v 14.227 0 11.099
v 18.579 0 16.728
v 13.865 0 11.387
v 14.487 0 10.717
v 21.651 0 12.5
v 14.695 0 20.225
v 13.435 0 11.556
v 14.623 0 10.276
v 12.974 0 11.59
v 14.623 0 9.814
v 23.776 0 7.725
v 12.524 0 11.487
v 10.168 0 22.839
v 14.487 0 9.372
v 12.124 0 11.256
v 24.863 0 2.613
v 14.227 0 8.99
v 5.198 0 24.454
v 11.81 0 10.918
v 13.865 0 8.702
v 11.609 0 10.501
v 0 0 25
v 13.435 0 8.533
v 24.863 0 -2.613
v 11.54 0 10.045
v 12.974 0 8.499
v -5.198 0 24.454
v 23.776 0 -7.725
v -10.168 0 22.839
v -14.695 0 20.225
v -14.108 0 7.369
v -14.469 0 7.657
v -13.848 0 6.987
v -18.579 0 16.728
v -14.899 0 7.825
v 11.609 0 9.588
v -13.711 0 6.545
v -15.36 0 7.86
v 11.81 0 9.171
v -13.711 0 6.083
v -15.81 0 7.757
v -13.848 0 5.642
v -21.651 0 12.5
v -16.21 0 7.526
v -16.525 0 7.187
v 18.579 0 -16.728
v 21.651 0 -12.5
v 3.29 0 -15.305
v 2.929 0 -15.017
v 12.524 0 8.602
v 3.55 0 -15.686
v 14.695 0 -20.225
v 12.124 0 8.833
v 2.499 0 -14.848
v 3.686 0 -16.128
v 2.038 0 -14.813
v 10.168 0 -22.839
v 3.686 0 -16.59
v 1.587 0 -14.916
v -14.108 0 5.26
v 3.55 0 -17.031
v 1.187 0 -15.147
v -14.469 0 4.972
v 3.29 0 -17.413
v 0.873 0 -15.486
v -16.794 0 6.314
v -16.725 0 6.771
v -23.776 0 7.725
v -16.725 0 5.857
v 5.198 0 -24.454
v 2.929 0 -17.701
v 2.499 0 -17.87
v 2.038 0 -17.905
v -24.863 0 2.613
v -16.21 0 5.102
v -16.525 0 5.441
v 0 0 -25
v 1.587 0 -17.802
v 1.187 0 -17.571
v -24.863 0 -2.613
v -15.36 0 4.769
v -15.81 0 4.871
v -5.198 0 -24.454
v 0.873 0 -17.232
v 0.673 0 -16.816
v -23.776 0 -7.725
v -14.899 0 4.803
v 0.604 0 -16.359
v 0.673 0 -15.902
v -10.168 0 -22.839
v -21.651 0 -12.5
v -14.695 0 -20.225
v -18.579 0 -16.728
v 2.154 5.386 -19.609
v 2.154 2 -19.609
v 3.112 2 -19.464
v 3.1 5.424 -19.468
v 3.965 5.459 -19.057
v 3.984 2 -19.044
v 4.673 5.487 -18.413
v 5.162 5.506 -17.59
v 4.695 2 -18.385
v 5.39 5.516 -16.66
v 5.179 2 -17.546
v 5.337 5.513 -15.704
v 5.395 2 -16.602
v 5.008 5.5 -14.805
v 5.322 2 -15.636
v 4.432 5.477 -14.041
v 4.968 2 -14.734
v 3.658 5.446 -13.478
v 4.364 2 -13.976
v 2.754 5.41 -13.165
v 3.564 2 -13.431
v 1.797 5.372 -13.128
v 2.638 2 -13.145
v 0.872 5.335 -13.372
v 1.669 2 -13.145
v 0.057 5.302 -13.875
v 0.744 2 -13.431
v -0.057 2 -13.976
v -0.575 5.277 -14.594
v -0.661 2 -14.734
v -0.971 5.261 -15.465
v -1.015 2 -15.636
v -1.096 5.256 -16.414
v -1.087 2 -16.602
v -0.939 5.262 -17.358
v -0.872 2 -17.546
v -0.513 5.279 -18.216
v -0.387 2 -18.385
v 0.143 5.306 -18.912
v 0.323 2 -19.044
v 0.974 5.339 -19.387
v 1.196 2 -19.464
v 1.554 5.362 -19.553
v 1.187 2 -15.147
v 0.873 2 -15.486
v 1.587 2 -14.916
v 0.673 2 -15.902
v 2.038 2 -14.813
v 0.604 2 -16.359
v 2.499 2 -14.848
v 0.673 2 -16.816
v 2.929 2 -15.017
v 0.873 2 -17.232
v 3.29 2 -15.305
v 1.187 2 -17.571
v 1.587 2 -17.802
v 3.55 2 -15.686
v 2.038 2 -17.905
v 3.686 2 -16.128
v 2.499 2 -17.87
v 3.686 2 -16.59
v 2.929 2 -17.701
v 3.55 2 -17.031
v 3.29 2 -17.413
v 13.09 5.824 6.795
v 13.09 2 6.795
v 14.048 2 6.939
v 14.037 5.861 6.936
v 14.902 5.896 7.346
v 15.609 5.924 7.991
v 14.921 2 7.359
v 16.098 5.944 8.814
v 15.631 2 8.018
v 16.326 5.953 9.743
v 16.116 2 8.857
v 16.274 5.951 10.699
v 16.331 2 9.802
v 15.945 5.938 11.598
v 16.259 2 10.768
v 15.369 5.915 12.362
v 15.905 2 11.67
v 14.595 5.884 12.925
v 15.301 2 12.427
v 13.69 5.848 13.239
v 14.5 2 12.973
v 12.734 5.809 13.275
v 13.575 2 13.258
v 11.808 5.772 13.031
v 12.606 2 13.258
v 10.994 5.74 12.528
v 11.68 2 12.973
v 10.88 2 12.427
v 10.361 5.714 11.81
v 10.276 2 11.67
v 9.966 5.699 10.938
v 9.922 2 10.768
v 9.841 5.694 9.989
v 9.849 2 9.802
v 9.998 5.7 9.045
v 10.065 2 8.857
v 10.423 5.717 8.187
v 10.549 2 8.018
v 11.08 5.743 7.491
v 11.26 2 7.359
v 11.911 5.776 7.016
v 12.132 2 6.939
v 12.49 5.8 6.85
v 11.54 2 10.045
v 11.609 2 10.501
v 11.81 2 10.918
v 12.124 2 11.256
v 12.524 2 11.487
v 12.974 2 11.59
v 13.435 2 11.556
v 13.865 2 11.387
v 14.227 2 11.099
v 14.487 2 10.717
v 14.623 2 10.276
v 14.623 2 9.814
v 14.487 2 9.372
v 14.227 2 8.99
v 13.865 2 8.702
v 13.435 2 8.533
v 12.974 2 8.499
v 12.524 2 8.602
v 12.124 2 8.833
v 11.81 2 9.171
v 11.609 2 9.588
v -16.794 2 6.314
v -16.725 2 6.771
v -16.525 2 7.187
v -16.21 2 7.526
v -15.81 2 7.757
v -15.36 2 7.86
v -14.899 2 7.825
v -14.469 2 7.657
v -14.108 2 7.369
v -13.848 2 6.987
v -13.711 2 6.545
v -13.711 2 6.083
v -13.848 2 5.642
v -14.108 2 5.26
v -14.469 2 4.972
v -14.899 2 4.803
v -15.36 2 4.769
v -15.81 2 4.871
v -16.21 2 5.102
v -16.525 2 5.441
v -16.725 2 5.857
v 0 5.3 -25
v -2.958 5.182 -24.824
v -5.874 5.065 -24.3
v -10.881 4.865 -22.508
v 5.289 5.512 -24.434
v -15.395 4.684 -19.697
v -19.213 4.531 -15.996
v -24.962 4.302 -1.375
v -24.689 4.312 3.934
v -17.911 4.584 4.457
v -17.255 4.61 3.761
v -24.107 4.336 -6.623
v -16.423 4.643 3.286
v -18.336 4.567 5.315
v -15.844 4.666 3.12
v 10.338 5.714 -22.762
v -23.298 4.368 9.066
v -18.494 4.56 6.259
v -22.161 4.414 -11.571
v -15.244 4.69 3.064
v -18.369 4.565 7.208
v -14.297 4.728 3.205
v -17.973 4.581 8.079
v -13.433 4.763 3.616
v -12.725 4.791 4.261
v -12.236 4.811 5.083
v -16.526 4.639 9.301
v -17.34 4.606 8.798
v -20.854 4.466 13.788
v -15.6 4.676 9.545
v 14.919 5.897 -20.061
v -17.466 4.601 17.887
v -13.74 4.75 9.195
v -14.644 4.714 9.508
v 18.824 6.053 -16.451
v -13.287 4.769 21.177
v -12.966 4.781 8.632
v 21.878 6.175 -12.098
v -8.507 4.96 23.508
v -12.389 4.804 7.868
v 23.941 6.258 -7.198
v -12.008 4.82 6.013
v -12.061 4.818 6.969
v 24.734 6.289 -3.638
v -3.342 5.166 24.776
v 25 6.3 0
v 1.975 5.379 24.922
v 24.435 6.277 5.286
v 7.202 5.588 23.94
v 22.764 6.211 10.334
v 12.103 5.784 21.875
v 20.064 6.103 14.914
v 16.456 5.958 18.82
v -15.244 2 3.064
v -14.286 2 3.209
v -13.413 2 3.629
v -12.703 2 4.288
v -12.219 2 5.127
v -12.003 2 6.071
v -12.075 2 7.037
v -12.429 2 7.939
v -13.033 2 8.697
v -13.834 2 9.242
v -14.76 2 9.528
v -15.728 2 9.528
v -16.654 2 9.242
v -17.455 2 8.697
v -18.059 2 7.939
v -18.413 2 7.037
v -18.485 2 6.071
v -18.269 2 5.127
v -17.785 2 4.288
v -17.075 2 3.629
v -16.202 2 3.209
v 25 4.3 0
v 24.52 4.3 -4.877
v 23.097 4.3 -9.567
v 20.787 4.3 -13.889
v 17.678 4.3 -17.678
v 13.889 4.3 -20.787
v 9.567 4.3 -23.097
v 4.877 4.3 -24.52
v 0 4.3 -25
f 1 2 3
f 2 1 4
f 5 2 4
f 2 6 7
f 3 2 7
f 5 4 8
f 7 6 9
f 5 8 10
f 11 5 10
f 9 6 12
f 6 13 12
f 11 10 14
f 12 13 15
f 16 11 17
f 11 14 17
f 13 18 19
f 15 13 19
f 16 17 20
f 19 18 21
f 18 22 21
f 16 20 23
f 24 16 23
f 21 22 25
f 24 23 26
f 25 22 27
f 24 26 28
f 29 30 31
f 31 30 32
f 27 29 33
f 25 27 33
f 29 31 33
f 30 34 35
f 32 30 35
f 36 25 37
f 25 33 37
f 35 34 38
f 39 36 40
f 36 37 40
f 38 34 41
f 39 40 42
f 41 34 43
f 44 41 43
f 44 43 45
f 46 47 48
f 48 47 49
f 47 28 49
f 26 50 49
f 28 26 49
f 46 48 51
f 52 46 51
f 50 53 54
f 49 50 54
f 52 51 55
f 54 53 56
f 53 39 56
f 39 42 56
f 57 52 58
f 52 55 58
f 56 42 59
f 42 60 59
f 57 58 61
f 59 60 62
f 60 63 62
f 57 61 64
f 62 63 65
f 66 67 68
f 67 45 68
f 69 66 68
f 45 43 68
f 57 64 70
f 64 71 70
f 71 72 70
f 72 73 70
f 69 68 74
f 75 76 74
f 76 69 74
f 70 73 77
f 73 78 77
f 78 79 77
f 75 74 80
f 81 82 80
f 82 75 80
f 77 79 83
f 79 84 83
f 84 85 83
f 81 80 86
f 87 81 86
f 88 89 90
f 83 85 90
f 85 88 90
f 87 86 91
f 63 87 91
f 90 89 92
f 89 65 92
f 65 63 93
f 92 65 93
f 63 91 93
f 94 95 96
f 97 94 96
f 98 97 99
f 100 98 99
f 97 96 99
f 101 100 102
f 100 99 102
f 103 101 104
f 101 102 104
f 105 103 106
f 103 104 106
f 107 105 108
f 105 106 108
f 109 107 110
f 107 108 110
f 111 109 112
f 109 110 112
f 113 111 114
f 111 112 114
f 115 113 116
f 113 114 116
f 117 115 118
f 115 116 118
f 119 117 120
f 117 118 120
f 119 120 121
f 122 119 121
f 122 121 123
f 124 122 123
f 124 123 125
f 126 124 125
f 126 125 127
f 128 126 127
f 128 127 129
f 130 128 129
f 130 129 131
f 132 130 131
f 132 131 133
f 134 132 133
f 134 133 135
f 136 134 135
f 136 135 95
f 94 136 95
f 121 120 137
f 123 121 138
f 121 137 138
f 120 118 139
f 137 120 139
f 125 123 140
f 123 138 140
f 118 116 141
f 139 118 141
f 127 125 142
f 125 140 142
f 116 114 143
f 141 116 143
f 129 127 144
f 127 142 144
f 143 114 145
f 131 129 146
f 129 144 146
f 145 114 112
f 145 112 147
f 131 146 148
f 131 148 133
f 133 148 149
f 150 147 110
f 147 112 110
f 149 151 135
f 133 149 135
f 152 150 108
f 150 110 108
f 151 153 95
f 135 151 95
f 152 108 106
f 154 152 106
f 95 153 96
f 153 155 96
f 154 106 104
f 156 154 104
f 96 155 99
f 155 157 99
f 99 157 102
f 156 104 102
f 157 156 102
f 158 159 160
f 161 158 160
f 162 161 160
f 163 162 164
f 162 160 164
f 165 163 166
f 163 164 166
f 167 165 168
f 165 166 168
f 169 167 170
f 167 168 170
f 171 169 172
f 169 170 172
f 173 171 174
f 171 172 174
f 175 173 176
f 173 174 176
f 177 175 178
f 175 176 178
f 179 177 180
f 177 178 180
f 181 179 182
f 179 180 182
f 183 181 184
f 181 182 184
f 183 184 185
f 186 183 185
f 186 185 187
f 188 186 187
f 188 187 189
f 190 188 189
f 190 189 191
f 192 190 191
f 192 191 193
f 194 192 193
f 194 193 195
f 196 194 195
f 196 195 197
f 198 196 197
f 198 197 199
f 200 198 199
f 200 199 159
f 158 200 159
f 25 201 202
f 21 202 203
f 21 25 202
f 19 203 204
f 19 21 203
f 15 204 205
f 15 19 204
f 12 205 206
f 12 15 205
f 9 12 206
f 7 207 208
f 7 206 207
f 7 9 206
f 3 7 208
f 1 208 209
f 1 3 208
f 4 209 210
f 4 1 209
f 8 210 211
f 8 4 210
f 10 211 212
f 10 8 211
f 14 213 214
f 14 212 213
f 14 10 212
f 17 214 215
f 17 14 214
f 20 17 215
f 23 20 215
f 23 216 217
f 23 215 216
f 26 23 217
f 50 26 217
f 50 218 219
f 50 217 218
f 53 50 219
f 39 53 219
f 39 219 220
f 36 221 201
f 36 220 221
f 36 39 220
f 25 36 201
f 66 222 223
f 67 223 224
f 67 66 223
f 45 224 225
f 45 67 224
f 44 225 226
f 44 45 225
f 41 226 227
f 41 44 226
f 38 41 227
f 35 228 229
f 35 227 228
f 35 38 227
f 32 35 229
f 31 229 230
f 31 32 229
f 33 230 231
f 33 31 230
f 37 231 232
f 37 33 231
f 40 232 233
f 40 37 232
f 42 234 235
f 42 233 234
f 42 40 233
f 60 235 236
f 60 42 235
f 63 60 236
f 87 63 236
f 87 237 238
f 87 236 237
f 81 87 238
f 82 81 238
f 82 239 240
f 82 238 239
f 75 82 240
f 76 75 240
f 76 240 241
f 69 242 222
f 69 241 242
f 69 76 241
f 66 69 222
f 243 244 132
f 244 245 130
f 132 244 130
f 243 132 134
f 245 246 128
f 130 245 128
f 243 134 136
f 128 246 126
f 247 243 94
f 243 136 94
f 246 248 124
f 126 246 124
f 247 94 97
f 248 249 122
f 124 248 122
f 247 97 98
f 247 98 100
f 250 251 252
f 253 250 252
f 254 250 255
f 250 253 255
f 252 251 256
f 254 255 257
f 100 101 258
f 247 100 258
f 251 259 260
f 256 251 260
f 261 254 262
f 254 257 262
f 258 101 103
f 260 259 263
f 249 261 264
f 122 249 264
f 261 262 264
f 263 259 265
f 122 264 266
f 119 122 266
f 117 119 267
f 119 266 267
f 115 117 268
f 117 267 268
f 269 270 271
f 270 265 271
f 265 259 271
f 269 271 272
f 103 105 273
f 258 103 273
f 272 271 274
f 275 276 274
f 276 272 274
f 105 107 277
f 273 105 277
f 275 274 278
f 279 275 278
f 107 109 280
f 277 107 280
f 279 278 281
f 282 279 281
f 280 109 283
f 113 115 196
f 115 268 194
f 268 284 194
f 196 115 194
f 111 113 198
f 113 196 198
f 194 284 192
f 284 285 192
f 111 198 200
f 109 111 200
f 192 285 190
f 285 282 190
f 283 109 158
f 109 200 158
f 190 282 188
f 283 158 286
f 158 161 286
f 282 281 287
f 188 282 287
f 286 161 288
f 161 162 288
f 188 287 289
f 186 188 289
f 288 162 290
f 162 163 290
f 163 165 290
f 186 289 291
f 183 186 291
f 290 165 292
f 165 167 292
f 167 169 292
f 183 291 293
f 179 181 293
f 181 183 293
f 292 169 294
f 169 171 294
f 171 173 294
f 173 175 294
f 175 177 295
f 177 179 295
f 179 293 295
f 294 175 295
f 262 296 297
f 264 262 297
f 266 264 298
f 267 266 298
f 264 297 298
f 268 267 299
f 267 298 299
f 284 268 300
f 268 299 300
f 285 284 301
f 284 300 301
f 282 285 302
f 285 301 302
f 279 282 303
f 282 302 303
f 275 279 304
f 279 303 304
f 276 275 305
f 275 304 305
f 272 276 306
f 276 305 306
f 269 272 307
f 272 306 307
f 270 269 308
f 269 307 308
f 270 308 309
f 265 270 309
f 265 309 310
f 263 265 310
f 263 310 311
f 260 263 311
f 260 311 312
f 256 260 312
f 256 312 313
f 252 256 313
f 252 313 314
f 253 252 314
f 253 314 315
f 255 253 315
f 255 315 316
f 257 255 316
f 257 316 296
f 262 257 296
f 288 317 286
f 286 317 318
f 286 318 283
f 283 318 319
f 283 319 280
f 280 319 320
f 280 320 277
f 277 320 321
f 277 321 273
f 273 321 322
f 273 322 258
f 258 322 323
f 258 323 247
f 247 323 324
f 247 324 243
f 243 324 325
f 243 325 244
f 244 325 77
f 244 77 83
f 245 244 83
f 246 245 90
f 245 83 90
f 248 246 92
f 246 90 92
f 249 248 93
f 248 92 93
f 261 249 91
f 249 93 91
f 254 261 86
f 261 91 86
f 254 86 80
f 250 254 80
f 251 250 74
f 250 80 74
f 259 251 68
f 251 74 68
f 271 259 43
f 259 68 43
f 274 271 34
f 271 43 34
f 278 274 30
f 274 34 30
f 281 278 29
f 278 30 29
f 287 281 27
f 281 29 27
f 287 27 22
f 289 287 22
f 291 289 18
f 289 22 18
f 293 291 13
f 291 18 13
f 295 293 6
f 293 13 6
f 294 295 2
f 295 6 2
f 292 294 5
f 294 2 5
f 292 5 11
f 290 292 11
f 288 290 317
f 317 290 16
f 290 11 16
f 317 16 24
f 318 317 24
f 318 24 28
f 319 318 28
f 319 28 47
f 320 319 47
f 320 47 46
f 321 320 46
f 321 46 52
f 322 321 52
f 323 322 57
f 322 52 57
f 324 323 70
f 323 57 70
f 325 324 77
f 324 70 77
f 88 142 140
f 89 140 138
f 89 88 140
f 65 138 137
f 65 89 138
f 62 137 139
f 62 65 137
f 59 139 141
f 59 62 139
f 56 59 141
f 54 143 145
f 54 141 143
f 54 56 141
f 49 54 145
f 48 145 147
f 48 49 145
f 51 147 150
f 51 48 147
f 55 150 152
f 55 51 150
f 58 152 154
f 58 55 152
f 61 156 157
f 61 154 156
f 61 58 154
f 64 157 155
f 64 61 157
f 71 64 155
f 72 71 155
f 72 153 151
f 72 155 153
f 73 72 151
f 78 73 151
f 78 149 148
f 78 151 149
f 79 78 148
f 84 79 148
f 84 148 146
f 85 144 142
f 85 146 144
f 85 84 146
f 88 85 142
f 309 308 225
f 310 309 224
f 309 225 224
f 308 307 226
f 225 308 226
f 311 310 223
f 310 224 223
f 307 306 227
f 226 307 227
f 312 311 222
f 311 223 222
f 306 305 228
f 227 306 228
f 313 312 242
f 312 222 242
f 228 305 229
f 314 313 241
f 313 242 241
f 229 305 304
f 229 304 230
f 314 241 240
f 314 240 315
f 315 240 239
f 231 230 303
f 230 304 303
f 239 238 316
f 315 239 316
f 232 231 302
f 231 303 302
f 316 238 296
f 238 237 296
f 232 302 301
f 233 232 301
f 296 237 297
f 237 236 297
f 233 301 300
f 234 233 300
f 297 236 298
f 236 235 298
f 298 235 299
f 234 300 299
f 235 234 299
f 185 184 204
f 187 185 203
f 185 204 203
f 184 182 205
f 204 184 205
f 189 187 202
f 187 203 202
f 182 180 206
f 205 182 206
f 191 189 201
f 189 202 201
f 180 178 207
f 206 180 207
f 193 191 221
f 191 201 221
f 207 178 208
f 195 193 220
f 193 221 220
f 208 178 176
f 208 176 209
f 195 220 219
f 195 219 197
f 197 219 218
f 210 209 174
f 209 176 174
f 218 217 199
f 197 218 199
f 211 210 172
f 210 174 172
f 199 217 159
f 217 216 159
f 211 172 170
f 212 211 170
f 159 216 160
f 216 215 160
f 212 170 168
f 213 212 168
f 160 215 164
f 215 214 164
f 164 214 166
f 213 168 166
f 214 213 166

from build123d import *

# Parameters (mm, degrees)
SKETCH1_R                            = 25
BOSS_EXTRUDE1_DEPTH                  = 4.3
BOSS_EXTRUDE2_REACH                  = 37.616
BOSS_EXTRUDE2_END_RADIUS             = 25
BOSS_EXTRUDE2_DIRECTION_2_REACH      = 37.616
BOSS_EXTRUDE2_DIRECTION_2_END_RADIUS = 25
CUT_EXTRUDE1_REACH                   = 37.912
SKETCH3_R                            = 1.55
CUT_EXTRUDE2_REACH                   = 37.616
SKETCH4_R                            = 3.25


with BuildPart() as part:
    # Sketch1 → Boss-Extrude1 (new body)
    with BuildSketch(Plane(origin=(0, 0, 0), x_dir=(1, 0, 0), z_dir=(0, 1, 0))):
        Circle(SKETCH1_R)
    extrude(amount=BOSS_EXTRUDE1_DEPTH)

    # Boss-Extrude2: up to this cylinder (the profile starts inside it)
    boss_extrude2_end = Plane(origin=(0, 4.966667, 0), z_dir=(0, -1, 0)) * Cylinder(BOSS_EXTRUDE2_END_RADIUS, 126.232, mode=Mode.PRIVATE)
    # Sketch2 → Boss-Extrude2 (add, up to the surface)
    with BuildSketch(Plane.XY, mode=Mode.PRIVATE) as boss_extrude2_sk1:
        Polygon((-25, 4.3), (25, 6.3), (25, 4.3), align=None)
    boss_extrude2_tool1 = extrude(boss_extrude2_sk1.sketch, amount=BOSS_EXTRUDE2_REACH, mode=Mode.PRIVATE) & boss_extrude2_end
    add(boss_extrude2_tool1.solids().sort_by_distance((8.333333, 4.966667, 0))[0])

    # Boss-Extrude2 direction 2: up to this cylinder (the profile starts inside it)
    boss_extrude2_direction_2_end = Plane(origin=(0, 4.966667, 0), z_dir=(0, -1, 0)) * Cylinder(BOSS_EXTRUDE2_DIRECTION_2_END_RADIUS, 126.232, mode=Mode.PRIVATE)
    # Sketch2 → Boss-Extrude2 direction 2 (add, up to the surface)
    with BuildSketch(Plane.XY, mode=Mode.PRIVATE) as boss_extrude2_direction_2_sk1:
        Polygon((-25, 4.3), (25, 6.3), (25, 4.3), align=None)
    boss_extrude2_direction_2_tool1 = extrude(boss_extrude2_direction_2_sk1.sketch, amount=-BOSS_EXTRUDE2_DIRECTION_2_REACH, mode=Mode.PRIVATE) & boss_extrude2_direction_2_end
    add(boss_extrude2_direction_2_tool1.solids().sort_by_distance((8.333333, 4.966667, 0))[0])

    # Sketch3 → Cut-Extrude1 (cut, up to next)
    with BuildSketch(Plane(origin=(0, 0, 0), x_dir=(1, 0, 0), z_dir=(0, 1, 0)), mode=Mode.PRIVATE) as cut_extrude1_sk1:
        with Locations((-15.244012286, -6.314276634)):
            Circle(SKETCH3_R)
    cut_extrude1_tool1 = extrude(cut_extrude1_sk1.sketch, amount=CUT_EXTRUDE1_REACH, mode=Mode.PRIVATE) & part.part
    # Sketch3 → Cut-Extrude1 (cut, up to next)
    with BuildSketch(Plane(origin=(0, 0, 0), x_dir=(1, 0, 0), z_dir=(0, 1, 0)), mode=Mode.PRIVATE) as cut_extrude1_sk2:
        with Locations((2.153682172, 16.358840213)):
            Circle(SKETCH3_R)
    cut_extrude1_tool2 = extrude(cut_extrude1_sk2.sketch, amount=CUT_EXTRUDE1_REACH, mode=Mode.PRIVATE) & part.part
    # Sketch3 → Cut-Extrude1 (cut, up to next)
    with BuildSketch(Plane(origin=(0, 0, 0), x_dir=(1, 0, 0), z_dir=(0, 1, 0)), mode=Mode.PRIVATE) as cut_extrude1_sk3:
        with Locations((13.090330115, -10.044563579)):
            Circle(SKETCH3_R)
    cut_extrude1_tool3 = extrude(cut_extrude1_sk3.sketch, amount=CUT_EXTRUDE1_REACH, mode=Mode.PRIVATE) & part.part
    add(cut_extrude1_tool1.solids().sort_by_distance((-15.244012, 0, 6.314277))[0], mode=Mode.SUBTRACT)
    add(cut_extrude1_tool2.solids().sort_by_distance((2.153682, 0, -16.35884))[0], mode=Mode.SUBTRACT)
    add(cut_extrude1_tool3.solids().sort_by_distance((13.09033, 0, 10.044564))[0], mode=Mode.SUBTRACT)

    # Sketch4 → Cut-Extrude2 (cut, up to next)
    with BuildSketch(Plane(origin=(0, 2, 0), x_dir=(-1, 0, 0), z_dir=(0, -1, 0)), mode=Mode.PRIVATE) as cut_extrude2_sk1:
        with Locations((-2.153682172, 16.358840213)):
            Circle(SKETCH4_R)
    cut_extrude2_tool1 = extrude(cut_extrude2_sk1.sketch, amount=-CUT_EXTRUDE2_REACH, mode=Mode.PRIVATE) & part.part
    # Sketch4 → Cut-Extrude2 (cut, up to next)
    with BuildSketch(Plane(origin=(0, 2, 0), x_dir=(-1, 0, 0), z_dir=(0, -1, 0)), mode=Mode.PRIVATE) as cut_extrude2_sk2:
        with Locations((15.244012286, -6.314276634)):
            Circle(SKETCH4_R)
    cut_extrude2_tool2 = extrude(cut_extrude2_sk2.sketch, amount=-CUT_EXTRUDE2_REACH, mode=Mode.PRIVATE) & part.part
    # Sketch4 → Cut-Extrude2 (cut, up to next)
    with BuildSketch(Plane(origin=(0, 2, 0), x_dir=(-1, 0, 0), z_dir=(0, -1, 0)), mode=Mode.PRIVATE) as cut_extrude2_sk3:
        with Locations((-13.090330115, -10.044563579)):
            Circle(SKETCH4_R)
    cut_extrude2_tool3 = extrude(cut_extrude2_sk3.sketch, amount=-CUT_EXTRUDE2_REACH, mode=Mode.PRIVATE) & part.part
    add(cut_extrude2_tool1.solids().sort_by_distance((2.153682, 2, -16.35884))[0], mode=Mode.SUBTRACT)
    add(cut_extrude2_tool2.solids().sort_by_distance((-15.244012, 2, 6.314277))[0], mode=Mode.SUBTRACT)
    add(cut_extrude2_tool3.solids().sort_by_distance((13.09033, 2, 10.044564))[0], mode=Mode.SUBTRACT)


solid = part.part
